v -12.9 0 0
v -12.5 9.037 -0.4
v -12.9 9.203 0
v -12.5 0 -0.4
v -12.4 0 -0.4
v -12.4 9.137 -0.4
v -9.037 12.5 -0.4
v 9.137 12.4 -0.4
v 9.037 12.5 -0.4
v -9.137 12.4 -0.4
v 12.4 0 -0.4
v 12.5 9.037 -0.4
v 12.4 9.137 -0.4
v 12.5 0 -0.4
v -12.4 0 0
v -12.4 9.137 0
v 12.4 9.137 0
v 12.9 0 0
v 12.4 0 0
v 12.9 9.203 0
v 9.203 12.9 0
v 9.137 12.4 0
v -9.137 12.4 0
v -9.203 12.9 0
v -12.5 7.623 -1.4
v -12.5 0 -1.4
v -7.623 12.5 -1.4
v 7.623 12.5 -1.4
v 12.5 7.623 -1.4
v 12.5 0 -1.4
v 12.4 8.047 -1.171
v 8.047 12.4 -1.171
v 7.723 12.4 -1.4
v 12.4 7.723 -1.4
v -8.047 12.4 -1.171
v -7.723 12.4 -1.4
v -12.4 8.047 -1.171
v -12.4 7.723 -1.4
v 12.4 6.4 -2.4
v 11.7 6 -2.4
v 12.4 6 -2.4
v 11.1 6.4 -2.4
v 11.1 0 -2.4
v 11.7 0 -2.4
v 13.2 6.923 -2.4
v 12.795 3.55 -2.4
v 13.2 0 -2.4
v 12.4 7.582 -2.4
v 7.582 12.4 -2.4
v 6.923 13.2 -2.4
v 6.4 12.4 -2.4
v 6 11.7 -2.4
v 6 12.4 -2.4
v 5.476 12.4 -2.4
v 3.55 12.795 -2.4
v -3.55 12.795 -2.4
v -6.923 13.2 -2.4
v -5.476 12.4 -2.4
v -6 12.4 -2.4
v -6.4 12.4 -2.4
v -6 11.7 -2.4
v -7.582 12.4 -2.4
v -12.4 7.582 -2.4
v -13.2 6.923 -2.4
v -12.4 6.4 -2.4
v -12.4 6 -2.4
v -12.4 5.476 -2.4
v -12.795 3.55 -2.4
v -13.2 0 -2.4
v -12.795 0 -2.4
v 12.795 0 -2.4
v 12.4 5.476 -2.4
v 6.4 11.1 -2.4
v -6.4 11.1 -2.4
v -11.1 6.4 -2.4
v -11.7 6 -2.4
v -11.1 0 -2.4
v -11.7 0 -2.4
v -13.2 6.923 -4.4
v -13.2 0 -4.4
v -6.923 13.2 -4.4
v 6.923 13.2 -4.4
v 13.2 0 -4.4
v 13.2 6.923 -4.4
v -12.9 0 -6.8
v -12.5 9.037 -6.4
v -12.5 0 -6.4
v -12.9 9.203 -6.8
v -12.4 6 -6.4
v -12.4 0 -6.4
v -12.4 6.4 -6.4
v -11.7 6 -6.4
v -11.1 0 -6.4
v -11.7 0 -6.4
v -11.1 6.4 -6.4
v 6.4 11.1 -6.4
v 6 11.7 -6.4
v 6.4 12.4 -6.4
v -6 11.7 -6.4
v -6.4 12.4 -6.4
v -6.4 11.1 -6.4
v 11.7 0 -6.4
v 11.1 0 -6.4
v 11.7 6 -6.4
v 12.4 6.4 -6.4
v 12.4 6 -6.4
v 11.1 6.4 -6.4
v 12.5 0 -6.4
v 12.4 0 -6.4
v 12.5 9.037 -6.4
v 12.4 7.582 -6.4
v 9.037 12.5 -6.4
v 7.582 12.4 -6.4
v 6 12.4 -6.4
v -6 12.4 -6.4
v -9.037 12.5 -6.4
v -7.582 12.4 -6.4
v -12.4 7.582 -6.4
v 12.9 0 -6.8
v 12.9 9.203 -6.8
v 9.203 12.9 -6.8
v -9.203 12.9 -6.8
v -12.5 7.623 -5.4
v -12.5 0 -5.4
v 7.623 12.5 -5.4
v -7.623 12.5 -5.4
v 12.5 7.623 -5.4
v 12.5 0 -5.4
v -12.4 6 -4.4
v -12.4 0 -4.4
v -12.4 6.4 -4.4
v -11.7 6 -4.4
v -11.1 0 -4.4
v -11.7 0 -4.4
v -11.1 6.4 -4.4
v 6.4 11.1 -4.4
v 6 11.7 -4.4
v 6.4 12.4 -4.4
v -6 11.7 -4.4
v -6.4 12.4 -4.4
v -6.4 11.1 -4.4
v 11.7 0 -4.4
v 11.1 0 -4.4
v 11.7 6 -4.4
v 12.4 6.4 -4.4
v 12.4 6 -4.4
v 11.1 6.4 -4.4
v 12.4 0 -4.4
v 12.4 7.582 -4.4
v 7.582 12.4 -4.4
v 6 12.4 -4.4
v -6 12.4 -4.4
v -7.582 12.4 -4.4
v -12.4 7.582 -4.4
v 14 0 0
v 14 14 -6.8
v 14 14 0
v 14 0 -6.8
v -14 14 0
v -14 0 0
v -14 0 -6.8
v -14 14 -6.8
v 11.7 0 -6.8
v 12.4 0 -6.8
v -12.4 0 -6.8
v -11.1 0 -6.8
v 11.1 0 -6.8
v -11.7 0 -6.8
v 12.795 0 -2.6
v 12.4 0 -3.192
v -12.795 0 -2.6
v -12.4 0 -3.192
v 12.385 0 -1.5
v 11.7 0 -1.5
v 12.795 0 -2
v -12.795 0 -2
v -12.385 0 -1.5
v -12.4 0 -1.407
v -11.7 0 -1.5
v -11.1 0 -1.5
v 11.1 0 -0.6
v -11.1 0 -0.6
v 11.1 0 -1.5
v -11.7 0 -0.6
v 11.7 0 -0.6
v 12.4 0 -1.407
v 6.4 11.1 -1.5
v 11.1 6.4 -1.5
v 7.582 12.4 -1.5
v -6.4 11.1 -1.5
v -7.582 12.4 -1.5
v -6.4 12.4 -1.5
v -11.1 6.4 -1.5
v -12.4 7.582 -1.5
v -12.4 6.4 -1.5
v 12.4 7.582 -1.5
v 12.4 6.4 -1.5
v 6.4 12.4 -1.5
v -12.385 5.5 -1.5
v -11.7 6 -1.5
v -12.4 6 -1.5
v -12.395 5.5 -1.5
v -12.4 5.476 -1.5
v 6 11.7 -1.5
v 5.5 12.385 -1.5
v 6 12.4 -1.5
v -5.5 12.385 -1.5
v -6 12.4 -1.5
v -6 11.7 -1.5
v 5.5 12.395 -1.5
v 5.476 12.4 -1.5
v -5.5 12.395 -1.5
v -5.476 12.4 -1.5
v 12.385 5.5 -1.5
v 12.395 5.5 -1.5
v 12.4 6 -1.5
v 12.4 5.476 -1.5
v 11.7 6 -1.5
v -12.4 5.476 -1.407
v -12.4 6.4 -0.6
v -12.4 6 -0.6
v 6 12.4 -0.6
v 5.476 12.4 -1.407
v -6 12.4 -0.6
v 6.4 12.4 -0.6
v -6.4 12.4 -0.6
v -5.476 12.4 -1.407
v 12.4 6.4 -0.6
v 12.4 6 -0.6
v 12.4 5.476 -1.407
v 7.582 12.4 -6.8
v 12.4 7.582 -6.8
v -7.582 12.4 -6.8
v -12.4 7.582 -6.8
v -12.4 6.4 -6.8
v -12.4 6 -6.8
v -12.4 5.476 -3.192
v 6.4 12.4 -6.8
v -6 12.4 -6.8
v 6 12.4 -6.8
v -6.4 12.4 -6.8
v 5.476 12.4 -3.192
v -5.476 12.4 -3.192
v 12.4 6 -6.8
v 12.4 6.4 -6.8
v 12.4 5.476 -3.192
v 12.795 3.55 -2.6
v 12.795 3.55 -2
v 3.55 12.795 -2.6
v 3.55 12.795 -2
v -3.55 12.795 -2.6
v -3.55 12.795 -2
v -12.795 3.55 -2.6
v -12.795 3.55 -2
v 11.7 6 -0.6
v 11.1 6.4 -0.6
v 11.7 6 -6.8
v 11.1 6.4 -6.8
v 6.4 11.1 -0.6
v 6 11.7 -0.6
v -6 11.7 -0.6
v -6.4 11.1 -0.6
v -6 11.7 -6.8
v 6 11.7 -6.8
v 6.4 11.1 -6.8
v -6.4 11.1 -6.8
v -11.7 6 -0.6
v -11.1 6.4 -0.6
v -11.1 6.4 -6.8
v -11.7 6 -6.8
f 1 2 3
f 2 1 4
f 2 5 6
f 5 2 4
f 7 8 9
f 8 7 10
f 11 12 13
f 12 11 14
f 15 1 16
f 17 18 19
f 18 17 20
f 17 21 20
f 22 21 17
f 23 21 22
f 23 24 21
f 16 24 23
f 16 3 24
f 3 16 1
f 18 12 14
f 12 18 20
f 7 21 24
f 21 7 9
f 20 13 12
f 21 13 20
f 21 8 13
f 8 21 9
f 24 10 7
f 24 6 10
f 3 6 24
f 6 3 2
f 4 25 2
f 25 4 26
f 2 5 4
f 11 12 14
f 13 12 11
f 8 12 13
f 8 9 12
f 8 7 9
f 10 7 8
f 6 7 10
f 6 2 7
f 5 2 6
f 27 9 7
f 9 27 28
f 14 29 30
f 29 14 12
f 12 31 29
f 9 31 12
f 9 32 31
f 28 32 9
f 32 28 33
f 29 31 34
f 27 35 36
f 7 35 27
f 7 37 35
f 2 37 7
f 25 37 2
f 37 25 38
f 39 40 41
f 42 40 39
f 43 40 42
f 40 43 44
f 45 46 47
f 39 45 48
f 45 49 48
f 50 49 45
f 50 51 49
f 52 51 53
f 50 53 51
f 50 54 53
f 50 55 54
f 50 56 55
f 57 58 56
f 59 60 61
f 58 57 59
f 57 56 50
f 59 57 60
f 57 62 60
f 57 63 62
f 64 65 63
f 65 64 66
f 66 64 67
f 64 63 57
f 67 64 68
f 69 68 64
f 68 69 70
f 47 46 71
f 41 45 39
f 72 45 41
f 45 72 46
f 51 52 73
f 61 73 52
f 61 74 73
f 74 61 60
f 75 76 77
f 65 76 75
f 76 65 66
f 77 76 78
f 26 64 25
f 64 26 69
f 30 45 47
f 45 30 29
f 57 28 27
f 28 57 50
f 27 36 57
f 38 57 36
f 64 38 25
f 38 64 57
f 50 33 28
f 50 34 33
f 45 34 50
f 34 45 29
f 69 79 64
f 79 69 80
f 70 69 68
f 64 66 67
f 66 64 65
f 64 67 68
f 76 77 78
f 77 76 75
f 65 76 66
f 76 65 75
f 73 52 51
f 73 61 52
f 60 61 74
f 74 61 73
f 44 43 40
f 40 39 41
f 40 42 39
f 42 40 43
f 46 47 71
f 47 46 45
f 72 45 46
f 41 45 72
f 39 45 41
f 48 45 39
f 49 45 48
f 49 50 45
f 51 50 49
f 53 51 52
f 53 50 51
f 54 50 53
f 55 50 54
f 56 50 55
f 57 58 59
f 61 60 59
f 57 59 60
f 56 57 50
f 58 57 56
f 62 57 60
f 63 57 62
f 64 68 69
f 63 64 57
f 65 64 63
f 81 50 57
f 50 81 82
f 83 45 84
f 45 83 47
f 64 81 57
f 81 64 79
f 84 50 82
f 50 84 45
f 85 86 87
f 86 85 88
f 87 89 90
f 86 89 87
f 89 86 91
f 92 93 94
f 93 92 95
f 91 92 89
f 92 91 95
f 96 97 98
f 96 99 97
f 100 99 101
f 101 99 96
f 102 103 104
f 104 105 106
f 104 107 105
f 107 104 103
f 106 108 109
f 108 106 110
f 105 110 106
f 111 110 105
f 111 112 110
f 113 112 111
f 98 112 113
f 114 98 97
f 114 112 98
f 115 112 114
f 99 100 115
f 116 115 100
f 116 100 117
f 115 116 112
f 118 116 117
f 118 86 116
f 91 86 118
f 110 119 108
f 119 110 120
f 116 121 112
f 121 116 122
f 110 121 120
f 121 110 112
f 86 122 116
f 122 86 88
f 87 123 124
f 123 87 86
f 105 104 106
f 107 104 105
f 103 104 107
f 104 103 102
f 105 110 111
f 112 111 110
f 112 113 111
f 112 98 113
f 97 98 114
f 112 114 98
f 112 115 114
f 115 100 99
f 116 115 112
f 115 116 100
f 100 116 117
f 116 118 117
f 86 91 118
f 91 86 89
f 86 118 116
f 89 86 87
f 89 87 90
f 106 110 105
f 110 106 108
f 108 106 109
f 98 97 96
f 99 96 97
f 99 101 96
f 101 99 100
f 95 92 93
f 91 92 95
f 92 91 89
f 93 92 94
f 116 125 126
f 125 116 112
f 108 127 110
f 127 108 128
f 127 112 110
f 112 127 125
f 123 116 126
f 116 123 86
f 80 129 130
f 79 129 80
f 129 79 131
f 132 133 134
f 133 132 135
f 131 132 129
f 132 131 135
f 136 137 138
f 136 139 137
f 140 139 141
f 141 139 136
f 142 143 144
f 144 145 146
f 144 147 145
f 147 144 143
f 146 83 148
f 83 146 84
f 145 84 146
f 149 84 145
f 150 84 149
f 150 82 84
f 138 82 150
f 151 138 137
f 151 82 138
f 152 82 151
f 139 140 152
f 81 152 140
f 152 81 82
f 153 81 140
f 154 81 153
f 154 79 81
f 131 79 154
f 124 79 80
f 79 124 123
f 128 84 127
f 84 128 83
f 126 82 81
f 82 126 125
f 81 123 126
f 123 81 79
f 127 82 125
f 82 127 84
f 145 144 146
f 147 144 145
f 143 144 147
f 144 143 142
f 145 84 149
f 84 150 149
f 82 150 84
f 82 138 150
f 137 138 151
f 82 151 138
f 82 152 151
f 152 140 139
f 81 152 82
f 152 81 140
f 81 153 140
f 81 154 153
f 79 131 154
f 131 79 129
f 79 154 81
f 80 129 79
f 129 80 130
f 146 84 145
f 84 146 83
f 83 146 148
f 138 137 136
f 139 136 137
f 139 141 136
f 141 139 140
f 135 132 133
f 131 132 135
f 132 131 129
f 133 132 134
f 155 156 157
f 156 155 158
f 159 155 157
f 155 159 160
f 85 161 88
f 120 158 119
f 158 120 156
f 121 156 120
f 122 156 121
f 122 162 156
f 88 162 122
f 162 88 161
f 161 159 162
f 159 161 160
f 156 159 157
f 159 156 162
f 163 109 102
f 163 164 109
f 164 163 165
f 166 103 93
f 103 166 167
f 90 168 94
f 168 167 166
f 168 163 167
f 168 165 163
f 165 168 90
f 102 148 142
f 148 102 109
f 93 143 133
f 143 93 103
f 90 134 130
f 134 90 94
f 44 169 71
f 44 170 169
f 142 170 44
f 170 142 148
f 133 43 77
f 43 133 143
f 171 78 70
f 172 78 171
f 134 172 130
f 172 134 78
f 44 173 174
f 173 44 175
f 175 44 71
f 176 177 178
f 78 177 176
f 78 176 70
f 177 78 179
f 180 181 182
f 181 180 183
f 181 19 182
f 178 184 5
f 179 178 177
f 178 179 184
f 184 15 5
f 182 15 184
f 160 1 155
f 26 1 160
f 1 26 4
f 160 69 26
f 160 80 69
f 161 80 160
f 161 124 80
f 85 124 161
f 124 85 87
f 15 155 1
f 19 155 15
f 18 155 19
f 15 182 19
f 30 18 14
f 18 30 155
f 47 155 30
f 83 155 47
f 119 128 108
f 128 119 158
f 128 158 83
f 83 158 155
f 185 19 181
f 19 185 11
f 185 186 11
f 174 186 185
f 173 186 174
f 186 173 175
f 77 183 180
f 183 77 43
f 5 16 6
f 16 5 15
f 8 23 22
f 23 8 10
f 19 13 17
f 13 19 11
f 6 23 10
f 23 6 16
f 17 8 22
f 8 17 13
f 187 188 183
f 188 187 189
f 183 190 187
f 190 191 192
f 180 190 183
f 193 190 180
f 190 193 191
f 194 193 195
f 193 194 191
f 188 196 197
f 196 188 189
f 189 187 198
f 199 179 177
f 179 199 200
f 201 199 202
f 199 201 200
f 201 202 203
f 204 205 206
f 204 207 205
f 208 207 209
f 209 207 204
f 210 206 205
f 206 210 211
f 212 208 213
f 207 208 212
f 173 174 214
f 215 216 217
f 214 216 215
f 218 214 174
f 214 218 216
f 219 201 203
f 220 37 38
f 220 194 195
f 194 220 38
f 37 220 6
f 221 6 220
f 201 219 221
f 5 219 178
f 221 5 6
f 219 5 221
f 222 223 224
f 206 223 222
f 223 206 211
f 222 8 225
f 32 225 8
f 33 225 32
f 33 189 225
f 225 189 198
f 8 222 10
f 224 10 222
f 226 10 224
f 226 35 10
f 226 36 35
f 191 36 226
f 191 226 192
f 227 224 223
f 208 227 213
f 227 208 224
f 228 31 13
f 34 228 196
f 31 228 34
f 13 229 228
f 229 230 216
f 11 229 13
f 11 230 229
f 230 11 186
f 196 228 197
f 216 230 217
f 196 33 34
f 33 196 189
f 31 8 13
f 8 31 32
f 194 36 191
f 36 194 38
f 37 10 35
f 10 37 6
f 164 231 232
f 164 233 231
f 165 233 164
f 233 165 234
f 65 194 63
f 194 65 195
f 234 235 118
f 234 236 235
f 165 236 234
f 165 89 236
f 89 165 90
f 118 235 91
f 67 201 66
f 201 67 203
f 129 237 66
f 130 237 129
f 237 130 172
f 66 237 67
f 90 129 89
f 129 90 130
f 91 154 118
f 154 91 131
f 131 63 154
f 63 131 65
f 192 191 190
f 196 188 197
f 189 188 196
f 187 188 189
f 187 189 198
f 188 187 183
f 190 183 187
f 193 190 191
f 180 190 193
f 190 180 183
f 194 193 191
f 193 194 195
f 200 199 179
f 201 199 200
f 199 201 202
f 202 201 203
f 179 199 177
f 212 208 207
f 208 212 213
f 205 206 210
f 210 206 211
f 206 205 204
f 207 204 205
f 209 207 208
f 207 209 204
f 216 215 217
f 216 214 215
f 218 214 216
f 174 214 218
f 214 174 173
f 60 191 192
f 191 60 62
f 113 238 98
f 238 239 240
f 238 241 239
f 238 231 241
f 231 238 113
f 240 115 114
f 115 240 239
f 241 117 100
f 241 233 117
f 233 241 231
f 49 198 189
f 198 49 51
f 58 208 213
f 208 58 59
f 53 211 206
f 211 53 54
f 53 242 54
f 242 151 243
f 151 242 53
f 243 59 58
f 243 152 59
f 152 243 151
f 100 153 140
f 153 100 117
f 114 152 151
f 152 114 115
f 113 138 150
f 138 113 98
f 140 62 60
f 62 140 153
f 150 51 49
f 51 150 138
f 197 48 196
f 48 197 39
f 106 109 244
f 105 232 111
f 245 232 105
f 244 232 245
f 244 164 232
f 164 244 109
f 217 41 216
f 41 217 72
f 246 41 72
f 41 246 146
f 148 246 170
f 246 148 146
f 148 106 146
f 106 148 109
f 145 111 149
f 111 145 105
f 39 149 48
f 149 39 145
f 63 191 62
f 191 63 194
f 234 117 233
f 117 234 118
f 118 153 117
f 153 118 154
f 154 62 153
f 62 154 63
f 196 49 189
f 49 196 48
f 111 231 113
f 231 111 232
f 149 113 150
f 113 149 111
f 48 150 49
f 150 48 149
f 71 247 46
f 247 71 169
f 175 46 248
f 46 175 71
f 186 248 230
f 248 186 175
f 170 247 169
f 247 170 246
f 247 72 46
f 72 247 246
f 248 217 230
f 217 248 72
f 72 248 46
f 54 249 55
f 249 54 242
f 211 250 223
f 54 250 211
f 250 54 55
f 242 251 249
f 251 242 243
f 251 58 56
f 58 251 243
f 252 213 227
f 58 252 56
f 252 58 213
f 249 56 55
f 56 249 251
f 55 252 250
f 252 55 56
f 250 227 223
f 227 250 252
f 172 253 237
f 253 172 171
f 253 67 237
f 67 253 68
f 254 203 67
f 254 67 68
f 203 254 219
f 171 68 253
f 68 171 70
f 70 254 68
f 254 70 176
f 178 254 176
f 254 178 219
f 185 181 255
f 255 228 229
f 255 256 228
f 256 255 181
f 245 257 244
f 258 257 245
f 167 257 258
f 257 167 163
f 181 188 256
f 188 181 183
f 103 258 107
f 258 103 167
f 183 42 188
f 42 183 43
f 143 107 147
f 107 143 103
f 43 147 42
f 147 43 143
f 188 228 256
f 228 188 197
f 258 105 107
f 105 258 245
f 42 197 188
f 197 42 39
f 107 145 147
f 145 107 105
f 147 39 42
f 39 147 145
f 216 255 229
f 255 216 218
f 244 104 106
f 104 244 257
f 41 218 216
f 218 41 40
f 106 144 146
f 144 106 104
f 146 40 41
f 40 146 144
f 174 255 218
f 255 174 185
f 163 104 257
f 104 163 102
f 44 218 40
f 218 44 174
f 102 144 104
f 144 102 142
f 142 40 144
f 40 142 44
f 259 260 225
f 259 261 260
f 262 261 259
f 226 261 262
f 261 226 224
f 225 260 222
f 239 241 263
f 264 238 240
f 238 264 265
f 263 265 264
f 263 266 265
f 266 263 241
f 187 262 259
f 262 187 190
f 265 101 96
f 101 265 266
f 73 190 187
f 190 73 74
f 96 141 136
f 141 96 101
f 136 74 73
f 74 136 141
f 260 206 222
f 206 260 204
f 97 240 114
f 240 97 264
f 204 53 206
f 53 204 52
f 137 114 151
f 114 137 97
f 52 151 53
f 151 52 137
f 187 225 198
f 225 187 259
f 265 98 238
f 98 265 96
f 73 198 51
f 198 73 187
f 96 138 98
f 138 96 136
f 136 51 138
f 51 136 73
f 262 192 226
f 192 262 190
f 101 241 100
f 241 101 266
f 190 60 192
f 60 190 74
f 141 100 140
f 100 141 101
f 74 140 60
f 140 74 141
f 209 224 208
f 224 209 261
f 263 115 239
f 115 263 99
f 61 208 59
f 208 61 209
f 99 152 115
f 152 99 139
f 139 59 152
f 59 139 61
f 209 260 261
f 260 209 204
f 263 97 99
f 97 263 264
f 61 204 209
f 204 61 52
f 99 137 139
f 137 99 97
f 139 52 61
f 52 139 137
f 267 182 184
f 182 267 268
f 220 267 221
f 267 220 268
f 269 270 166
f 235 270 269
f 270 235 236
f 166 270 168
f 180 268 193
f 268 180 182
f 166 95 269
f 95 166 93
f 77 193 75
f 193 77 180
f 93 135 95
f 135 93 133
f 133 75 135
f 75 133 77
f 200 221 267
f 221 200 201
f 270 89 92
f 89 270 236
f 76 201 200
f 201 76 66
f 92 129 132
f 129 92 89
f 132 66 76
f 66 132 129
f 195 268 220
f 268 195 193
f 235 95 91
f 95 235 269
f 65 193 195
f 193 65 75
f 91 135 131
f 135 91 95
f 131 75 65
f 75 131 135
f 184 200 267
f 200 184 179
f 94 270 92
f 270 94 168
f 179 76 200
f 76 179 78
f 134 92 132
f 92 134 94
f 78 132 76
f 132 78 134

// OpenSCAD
// opengrid_tile_example.scad -- a snap fitted into a test tile and sectioned
// through the middle, so the retaining nub and the groove it sits in show up.
// Each part is cut separately so the section keeps its own colour.
include <../opengrid.scad>

module front_half_cut() {
    translate([-20, -20, -20]) cube([40, 20, 40]);
}

color("silver")
    difference() {
        translate([-14, -14, 0]) opengrid_tile(1, 1);
        front_half_cut();
    }

color("orangered")
    difference() {
        opengrid_snap();
        front_half_cut();
    }
